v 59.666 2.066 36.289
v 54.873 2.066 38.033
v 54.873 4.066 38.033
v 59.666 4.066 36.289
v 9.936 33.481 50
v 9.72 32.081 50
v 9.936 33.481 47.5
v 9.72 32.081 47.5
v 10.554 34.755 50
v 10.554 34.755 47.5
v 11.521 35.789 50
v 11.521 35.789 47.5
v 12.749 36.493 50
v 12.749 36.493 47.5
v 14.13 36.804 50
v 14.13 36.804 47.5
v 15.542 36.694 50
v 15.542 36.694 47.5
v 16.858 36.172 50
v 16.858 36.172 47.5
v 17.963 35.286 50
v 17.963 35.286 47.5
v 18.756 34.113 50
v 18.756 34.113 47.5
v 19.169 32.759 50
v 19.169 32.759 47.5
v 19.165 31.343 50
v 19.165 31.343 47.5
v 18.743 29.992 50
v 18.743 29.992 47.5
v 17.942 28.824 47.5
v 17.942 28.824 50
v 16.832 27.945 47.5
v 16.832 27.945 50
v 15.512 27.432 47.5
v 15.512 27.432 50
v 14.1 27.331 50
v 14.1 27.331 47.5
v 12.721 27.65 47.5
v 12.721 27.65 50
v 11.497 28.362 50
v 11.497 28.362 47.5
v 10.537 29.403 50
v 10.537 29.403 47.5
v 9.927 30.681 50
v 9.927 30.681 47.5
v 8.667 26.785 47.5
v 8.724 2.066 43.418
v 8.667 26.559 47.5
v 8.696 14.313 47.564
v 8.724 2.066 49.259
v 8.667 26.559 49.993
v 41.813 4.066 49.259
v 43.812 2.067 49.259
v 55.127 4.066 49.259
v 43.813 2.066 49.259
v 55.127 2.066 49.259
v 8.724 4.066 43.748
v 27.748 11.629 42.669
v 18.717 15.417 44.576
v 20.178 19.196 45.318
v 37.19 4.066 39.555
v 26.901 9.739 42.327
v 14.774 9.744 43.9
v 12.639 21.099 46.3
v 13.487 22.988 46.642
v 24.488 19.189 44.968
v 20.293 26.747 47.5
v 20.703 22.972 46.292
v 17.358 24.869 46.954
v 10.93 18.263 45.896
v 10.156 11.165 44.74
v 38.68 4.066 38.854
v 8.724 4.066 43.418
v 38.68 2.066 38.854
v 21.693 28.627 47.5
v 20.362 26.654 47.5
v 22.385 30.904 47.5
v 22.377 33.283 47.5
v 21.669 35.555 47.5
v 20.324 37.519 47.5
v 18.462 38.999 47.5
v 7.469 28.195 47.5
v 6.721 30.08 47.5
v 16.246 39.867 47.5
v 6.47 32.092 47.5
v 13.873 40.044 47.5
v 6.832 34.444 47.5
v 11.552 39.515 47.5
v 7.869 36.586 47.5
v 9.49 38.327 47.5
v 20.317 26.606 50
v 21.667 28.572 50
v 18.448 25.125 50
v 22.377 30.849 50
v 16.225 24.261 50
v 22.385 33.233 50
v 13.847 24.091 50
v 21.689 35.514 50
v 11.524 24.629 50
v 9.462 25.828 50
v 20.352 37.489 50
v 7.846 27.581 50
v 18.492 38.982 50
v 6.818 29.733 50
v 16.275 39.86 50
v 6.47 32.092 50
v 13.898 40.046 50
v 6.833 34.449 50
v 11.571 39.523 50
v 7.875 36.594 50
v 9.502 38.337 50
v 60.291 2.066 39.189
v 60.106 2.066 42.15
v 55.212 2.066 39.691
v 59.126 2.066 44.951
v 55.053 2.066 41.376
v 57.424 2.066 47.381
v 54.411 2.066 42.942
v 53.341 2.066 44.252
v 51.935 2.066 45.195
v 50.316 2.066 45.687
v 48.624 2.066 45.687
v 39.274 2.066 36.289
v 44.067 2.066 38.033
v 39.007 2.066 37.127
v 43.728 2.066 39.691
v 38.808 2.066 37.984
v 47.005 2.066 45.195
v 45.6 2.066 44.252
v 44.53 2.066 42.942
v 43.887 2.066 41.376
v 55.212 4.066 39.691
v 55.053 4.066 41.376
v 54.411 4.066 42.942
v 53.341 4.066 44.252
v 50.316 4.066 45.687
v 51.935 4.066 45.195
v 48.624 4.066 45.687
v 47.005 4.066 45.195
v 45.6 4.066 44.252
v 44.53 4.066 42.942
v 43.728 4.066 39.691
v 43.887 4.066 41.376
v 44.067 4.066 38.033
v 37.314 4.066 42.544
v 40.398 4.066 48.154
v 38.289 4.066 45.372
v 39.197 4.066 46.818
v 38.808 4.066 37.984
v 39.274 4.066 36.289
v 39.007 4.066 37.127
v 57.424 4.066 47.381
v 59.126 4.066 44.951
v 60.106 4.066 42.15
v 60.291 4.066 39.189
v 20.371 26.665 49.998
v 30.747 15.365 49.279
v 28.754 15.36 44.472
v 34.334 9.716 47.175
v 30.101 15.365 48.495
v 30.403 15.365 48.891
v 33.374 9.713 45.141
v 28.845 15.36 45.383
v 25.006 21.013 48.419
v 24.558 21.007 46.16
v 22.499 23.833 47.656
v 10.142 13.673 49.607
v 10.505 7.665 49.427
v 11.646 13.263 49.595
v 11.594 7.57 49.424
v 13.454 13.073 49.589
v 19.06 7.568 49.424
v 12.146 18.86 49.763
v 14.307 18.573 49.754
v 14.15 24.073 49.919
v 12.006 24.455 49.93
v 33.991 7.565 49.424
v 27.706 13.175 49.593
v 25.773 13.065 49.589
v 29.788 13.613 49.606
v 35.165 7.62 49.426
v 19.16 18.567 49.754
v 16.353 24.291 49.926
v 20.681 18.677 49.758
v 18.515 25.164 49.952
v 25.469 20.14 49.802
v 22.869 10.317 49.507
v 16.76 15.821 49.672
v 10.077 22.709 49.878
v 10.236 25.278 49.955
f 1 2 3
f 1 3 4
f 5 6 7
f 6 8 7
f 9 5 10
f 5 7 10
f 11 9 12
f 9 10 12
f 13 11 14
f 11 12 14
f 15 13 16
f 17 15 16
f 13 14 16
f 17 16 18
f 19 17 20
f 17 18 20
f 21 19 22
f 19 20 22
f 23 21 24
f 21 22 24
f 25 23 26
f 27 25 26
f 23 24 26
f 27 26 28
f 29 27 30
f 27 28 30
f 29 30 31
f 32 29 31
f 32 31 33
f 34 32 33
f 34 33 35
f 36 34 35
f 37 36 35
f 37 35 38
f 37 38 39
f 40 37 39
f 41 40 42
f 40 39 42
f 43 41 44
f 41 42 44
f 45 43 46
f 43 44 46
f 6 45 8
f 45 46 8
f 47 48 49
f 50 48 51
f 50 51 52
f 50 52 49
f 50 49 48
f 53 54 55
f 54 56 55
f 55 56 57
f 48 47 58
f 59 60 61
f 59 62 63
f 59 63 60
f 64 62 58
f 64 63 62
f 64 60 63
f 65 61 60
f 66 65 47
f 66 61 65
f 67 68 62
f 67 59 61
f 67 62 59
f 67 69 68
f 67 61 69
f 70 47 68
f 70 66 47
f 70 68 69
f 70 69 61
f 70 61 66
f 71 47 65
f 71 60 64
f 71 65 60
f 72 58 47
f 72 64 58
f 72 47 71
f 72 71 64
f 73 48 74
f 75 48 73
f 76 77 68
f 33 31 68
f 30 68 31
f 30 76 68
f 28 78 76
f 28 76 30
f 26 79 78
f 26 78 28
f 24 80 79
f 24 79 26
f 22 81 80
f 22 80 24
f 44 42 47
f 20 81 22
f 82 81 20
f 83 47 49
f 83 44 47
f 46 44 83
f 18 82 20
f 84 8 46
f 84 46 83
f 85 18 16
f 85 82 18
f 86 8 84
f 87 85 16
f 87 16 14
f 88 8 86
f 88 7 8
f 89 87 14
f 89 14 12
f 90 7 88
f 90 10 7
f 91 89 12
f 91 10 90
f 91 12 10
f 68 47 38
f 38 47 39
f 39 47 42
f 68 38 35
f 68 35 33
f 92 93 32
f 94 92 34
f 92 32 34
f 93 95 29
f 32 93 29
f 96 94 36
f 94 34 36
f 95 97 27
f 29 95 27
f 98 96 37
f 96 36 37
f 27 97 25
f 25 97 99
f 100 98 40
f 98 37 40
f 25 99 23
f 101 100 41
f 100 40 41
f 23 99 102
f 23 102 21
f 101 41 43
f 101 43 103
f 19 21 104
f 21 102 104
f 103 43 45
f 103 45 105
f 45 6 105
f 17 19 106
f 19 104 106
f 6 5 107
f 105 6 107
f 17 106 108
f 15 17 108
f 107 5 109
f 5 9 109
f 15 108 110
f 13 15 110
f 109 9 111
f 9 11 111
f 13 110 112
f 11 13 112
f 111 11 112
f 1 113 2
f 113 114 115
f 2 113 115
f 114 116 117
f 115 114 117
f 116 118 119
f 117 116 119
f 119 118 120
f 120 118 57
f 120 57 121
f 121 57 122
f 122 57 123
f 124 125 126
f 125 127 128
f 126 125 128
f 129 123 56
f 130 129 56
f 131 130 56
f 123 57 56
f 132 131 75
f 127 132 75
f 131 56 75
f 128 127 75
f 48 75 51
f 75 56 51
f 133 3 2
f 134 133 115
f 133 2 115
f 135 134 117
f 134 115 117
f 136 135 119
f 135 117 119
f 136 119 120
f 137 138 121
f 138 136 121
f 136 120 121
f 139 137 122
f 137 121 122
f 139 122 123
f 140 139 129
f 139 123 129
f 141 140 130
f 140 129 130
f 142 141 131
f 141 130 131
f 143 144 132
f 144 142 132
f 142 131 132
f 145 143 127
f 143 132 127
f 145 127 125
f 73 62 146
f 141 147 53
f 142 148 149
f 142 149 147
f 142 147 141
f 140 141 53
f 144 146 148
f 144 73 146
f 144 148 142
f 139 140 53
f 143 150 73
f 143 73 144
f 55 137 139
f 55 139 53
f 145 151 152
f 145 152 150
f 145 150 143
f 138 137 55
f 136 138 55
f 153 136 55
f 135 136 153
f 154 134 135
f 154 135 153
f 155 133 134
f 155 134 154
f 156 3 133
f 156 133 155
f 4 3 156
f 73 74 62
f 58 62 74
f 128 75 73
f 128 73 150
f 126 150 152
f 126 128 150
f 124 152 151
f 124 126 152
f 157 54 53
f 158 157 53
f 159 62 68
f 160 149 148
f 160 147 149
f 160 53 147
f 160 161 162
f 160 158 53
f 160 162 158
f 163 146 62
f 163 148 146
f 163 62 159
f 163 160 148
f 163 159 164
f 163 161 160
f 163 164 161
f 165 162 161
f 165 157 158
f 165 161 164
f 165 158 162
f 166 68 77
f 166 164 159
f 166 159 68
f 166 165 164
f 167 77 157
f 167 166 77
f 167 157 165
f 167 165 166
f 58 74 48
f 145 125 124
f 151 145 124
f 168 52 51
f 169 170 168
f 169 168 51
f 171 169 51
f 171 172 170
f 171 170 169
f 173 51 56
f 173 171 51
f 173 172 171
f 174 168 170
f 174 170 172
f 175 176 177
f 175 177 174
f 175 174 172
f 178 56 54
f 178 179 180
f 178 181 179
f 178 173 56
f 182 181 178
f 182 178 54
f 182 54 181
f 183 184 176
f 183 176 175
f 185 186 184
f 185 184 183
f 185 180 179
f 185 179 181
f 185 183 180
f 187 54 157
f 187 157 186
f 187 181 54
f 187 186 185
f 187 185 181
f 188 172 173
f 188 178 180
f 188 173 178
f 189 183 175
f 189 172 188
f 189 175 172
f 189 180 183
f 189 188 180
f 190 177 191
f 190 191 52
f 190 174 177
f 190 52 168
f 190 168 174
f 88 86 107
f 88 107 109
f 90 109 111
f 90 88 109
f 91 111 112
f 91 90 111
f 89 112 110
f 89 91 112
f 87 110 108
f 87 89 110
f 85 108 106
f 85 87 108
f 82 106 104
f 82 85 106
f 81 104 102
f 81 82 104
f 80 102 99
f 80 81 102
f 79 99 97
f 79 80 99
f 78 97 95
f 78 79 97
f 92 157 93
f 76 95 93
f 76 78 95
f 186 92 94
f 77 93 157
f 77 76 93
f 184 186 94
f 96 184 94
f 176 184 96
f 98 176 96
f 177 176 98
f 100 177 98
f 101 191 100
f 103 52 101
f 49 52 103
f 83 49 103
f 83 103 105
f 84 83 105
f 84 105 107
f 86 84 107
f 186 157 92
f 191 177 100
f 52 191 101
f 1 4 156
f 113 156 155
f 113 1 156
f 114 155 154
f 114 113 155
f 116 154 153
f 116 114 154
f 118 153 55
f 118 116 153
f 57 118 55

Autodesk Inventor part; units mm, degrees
ref_plane "Work Plane6" through (14.4702, 32.0662, 39.5) normal (0, 0, 1) x (1, 0, 0)
sketch "Sketch1" plane through (14.4702, 32.0662, 39.5) normal (0, 0, 1) x (1, 0, 0)
  point P0 (-14.4702, -32.0662)
ref_plane "Work Plane1" through (14.4702, 32.0662, 47.5) normal (0, 0, -1) x (-1, 0.0032, 0)
sketch "Sketch2" plane through (14.4702, 32.0662, 47.5) normal (0, 0, -1) x (-1, 0.0032, 0)
  line L0 (-3.06, 5.3) -> (3.06, 5.3)
  line L1 (3.06, 5.3) -> (6.1199, 0)
  line L2 (6.1199, 0) -> (3.06, -5.3)
  line L3 (3.06, -5.3) -> (-3.06, -5.3)
  line L4 (-3.06, -5.3) -> (-6.1199, 0)
  line L5 (-6.1199, 0) -> (-3.06, 5.3)
  circle A0 centre (0, 0) radius 8
  line L6 (-3.06, -5.3) -> (-3.06, 5.3)
  line L7 (-3.06, 5.3) -> (-8, 5.3)
  line L8 (-8, 5.3) -> (-8, -5.3)
  line L9 (-8, -5.3) -> (-3.06, -5.3)
  circle A1 centre (0, 0) radius 4.75
  point P0 (14.3663, -32.1129)
  point P1 (-5.9925, -5.3)
  point P2 (-5.9925, 5.3)
  point P3 (-3.06, 3.6331)
  point P4 (-3.06, -3.6331)
  point P5 (-3.06, -5.3)
  point P6 (-3.06, 5.3)
  point P7 (-3.06, -5.3)
  point P8 (-3.06, 5.3)
  point P9 (-3.06, -5.3)
  point P10 (-8, 0)
  point P11 (-3.06, 5.3)
  point P12 (-3.06, -5.3)
  dimension "d3" = 10.6
  dimension "d4" = 16
  dimension "d9" = 9.5
extrude "Extrusion1" add sketch "Sketch2" against normal blind 2.5 contours L7 A0 L9 L3 L2 L1 L0 | L6 A1 L4 L5 | L0 L1 L2 L3 L6 A1 | L5 L4 L9 A0 L7
ref_plane "Work Plane2" through (14.4702, 32.0662, 46.35) normal (0, 0, -1) x (-1, 0.0032, 0)
ref_plane "Work Plane4" through (20.4455, 26.7469, 47.5) normal (0.0032, 1, 0) x (1, -0.0032, 0)
sketch "Sketch5" plane through (20.4455, 26.7469, 47.5) normal (0.0032, 1, 0) x (1, -0.0032, 0)
  line L0 (-13.9925, -2.5) -> (2.0075, -2.5) projected
  line L1 (2.0075, 0) -> (-13.9925, 0) projected
  line L2 (-0.1528, -2.5) -> (-0.1528, 0)
  line L3 (-11.7789, -2.5) -> (-11.7789, 0)
  line L4 (2.0075, 0) -> (-13.9925, 0) projected
  point P0 (-20.3588, 47.5)
ref_plane "Work Plane7" through (-59.5298, 2.0662, -55) normal (0, 1, 0) x (1, 0, 0)
sketch "Sketch6" plane through (-59.5298, 2.0662, -55) normal (0, 1, 0) x (1, 0, 0)
  circle A0 centre (109, -95) radius 5.35 projected
  circle A1 centre (109, -95) radius 5.75
  circle A2 centre (109, -95) radius 10.8507
  line L0 (109, -95) -> (98.8037, -91.2888)
  line L1 (109, -95) -> (119.1963, -91.2888)
  line L2 (109, -95) -> (98.1493, -95)
  line L3 (66.0434, -104.5) -> (82.0433, -104.5) projected
  line L4 (82.0433, -104.5) -> (114.2428, -104.5)
  line L5 (66, -105) -> (82, -105) projected
  line L6 (66, -104.5) -> (82, -104.5) projected
  line L7 (82, -105.5) -> (82.0433, -105.5) projected
  point P0 (59.5298, -55)
  point P1 (103.5968, -93.0334)
  point P2 (114.4032, -93.0334)
  point P3 (103.7572, -104.5)
  dimension "d12" = 11.5
  dimension "d13" = 20
  dimension "d14" = 160
extrude "Extrusion3" add sketch "Sketch6" along normal blind 2 contours L1 A2 L4 L2 A1 | L2 A2 L0 A1
ref_plane "Work Plane8" through (-59.5298, 2.0662, -55) normal (0, 1, 0) x (1, 0, 0)
sketch "Sketch7" plane through (-59.5298, 2.0662, -55) normal (0, 1, 0) x (1, 0, 0)
  line L0 (68.2541, -98.4179) -> (68.2541, -104.2594) projected
  line L1 (79.6782, -98.4179) -> (79.6782, -104.2594) construction
  line L2 (68.2541, -98.4179) -> (103.5968, -93.0334)
  line L3 (68.2541, -104.2594) -> (103.343, -104.2594)
  arc A0 (98.8037, -91.2888) -> (119.1963, -91.2888) centre (109, -95) ccw projected
  line L4 (103.5968, -93.0334) -> (98.8037, -91.2888) projected
  arc A1 (103.5968, -93.0334) -> (109, -100.75) centre (109, -95) ccw
  line L5 (103.343, -104.2594) -> (109, -100.75)
  arc A2 (98.21, -93.8541) -> (103.343, -104.2594) centre (109, -95) ccw
  line L6 (103.343, -104.2594) -> (114.657, -104.2594)
  circle A3 centre (109, -95) radius 10.8507 projected
  point P0 (59.5298, -55)
loft "Loft1" add profiles "Sketch7", "Sketch5" contours L2 A0 L3 L0 / all
extrude "Extrusion4" add sketch "Sketch7" along normal blind 2 contours L2 A0 L3 L0
ref_plane "Work Plane5" through (-59.5298, 2.0662, -55) normal (0, 1, 0) x (1, 0, 0)
sketch "Sketch9" plane through (-59.5298, 2.0662, -55) normal (0, 1, 0) x (1, 0, 0)
  point P0 (59.5298, -55)
extrude "Extrusion6" cut sketch "Sketch7" along normal blind 10 contours L6 A0
properties part number "Pot_mount_best"
